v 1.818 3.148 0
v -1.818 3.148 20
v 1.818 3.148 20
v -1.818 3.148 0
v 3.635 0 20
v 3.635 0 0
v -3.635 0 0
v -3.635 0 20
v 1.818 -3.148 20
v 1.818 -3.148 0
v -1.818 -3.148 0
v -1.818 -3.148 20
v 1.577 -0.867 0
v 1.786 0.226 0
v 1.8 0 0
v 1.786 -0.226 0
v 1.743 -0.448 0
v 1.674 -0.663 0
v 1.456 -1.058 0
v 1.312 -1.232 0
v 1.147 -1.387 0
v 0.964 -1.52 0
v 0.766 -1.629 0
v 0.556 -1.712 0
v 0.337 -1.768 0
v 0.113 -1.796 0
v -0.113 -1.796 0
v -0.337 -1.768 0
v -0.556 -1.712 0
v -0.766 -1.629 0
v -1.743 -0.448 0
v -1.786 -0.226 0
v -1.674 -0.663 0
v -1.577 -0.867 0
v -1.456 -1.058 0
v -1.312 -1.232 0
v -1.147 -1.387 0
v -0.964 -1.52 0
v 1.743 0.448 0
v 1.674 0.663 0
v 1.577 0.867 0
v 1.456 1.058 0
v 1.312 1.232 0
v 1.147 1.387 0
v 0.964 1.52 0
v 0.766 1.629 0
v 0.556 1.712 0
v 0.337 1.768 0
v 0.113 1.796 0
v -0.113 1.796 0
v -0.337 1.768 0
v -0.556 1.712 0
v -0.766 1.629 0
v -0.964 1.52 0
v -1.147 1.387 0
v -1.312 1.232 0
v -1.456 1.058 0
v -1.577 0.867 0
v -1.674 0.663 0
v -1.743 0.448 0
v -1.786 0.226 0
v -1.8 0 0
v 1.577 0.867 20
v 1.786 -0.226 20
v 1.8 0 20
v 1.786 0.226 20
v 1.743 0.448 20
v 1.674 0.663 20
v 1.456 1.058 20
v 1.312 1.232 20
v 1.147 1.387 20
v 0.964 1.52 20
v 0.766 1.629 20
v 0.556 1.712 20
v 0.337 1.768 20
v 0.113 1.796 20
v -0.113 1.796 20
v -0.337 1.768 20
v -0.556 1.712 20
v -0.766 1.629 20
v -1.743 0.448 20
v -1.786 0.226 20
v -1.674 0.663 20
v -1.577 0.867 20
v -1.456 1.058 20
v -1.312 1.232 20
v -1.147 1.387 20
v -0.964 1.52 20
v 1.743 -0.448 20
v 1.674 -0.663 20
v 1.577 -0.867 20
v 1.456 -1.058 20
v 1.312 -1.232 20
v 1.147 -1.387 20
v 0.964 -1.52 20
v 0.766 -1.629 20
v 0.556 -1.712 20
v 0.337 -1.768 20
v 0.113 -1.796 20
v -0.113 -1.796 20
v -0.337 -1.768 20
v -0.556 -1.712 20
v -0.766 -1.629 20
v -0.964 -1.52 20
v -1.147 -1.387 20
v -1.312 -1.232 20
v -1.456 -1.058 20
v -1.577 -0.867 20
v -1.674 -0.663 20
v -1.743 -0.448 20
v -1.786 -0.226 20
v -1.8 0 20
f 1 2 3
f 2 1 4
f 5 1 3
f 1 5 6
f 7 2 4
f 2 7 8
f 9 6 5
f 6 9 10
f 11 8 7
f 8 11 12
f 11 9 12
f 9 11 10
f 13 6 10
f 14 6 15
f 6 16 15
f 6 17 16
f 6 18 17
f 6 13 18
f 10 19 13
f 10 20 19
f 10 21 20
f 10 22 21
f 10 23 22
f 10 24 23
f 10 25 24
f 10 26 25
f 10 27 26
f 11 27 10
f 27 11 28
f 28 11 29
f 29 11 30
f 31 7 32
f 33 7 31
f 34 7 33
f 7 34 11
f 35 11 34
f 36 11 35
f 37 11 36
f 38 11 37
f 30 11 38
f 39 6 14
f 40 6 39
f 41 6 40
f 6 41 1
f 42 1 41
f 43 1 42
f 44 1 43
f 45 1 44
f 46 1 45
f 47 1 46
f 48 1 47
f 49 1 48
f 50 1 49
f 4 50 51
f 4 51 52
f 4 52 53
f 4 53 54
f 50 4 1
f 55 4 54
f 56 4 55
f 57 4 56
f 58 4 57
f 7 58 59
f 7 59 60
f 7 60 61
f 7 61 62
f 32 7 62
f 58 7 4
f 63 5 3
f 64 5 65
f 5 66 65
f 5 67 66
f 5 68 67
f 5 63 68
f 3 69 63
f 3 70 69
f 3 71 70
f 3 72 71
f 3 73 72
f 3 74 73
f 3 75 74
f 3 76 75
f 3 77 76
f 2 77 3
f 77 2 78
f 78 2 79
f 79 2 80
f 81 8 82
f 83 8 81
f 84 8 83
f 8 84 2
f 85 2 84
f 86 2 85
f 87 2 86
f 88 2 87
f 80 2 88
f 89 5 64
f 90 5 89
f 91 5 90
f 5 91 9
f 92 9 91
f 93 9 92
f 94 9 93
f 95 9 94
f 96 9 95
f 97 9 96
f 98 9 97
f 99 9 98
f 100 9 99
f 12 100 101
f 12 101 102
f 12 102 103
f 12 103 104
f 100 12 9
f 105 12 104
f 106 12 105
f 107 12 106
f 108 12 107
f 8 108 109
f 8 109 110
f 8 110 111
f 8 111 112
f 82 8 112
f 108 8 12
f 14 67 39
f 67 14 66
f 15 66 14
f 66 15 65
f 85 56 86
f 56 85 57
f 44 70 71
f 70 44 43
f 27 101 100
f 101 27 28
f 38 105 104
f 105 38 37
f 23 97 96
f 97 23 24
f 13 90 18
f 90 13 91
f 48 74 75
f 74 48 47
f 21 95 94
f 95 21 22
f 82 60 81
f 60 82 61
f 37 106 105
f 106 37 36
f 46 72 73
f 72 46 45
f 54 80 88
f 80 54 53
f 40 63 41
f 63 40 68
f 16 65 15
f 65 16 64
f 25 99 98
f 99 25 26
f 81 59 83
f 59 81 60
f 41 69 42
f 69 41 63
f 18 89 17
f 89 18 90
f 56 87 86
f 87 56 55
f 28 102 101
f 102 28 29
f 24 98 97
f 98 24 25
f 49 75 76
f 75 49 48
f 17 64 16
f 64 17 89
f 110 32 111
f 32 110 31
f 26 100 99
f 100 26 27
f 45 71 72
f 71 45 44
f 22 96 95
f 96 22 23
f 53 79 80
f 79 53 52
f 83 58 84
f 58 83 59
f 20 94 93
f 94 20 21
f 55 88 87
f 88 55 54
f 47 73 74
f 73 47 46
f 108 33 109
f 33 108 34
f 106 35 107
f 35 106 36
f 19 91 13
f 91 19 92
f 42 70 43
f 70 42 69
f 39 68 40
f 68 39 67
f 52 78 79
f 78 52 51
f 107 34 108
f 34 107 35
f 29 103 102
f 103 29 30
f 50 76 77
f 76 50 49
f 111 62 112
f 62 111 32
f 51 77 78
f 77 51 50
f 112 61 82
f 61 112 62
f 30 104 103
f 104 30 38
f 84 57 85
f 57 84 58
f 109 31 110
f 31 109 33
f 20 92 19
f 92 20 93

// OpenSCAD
$fn = 50;


difference() {
	union() {
		linear_extrude(height = 20) {
			polygon(points = [[3.6351000000, 0.0000000000], [1.8175500000, 3.1480889453], [-1.8175500000, 3.1480889453], [-3.6351000000, 0.0000000000], [-1.8175500000, -3.1480889453], [1.8175500000, -3.1480889453]]);
		}
	}
	union() {
		cylinder(h = 20, r = 1.8000000000);
	}
}
